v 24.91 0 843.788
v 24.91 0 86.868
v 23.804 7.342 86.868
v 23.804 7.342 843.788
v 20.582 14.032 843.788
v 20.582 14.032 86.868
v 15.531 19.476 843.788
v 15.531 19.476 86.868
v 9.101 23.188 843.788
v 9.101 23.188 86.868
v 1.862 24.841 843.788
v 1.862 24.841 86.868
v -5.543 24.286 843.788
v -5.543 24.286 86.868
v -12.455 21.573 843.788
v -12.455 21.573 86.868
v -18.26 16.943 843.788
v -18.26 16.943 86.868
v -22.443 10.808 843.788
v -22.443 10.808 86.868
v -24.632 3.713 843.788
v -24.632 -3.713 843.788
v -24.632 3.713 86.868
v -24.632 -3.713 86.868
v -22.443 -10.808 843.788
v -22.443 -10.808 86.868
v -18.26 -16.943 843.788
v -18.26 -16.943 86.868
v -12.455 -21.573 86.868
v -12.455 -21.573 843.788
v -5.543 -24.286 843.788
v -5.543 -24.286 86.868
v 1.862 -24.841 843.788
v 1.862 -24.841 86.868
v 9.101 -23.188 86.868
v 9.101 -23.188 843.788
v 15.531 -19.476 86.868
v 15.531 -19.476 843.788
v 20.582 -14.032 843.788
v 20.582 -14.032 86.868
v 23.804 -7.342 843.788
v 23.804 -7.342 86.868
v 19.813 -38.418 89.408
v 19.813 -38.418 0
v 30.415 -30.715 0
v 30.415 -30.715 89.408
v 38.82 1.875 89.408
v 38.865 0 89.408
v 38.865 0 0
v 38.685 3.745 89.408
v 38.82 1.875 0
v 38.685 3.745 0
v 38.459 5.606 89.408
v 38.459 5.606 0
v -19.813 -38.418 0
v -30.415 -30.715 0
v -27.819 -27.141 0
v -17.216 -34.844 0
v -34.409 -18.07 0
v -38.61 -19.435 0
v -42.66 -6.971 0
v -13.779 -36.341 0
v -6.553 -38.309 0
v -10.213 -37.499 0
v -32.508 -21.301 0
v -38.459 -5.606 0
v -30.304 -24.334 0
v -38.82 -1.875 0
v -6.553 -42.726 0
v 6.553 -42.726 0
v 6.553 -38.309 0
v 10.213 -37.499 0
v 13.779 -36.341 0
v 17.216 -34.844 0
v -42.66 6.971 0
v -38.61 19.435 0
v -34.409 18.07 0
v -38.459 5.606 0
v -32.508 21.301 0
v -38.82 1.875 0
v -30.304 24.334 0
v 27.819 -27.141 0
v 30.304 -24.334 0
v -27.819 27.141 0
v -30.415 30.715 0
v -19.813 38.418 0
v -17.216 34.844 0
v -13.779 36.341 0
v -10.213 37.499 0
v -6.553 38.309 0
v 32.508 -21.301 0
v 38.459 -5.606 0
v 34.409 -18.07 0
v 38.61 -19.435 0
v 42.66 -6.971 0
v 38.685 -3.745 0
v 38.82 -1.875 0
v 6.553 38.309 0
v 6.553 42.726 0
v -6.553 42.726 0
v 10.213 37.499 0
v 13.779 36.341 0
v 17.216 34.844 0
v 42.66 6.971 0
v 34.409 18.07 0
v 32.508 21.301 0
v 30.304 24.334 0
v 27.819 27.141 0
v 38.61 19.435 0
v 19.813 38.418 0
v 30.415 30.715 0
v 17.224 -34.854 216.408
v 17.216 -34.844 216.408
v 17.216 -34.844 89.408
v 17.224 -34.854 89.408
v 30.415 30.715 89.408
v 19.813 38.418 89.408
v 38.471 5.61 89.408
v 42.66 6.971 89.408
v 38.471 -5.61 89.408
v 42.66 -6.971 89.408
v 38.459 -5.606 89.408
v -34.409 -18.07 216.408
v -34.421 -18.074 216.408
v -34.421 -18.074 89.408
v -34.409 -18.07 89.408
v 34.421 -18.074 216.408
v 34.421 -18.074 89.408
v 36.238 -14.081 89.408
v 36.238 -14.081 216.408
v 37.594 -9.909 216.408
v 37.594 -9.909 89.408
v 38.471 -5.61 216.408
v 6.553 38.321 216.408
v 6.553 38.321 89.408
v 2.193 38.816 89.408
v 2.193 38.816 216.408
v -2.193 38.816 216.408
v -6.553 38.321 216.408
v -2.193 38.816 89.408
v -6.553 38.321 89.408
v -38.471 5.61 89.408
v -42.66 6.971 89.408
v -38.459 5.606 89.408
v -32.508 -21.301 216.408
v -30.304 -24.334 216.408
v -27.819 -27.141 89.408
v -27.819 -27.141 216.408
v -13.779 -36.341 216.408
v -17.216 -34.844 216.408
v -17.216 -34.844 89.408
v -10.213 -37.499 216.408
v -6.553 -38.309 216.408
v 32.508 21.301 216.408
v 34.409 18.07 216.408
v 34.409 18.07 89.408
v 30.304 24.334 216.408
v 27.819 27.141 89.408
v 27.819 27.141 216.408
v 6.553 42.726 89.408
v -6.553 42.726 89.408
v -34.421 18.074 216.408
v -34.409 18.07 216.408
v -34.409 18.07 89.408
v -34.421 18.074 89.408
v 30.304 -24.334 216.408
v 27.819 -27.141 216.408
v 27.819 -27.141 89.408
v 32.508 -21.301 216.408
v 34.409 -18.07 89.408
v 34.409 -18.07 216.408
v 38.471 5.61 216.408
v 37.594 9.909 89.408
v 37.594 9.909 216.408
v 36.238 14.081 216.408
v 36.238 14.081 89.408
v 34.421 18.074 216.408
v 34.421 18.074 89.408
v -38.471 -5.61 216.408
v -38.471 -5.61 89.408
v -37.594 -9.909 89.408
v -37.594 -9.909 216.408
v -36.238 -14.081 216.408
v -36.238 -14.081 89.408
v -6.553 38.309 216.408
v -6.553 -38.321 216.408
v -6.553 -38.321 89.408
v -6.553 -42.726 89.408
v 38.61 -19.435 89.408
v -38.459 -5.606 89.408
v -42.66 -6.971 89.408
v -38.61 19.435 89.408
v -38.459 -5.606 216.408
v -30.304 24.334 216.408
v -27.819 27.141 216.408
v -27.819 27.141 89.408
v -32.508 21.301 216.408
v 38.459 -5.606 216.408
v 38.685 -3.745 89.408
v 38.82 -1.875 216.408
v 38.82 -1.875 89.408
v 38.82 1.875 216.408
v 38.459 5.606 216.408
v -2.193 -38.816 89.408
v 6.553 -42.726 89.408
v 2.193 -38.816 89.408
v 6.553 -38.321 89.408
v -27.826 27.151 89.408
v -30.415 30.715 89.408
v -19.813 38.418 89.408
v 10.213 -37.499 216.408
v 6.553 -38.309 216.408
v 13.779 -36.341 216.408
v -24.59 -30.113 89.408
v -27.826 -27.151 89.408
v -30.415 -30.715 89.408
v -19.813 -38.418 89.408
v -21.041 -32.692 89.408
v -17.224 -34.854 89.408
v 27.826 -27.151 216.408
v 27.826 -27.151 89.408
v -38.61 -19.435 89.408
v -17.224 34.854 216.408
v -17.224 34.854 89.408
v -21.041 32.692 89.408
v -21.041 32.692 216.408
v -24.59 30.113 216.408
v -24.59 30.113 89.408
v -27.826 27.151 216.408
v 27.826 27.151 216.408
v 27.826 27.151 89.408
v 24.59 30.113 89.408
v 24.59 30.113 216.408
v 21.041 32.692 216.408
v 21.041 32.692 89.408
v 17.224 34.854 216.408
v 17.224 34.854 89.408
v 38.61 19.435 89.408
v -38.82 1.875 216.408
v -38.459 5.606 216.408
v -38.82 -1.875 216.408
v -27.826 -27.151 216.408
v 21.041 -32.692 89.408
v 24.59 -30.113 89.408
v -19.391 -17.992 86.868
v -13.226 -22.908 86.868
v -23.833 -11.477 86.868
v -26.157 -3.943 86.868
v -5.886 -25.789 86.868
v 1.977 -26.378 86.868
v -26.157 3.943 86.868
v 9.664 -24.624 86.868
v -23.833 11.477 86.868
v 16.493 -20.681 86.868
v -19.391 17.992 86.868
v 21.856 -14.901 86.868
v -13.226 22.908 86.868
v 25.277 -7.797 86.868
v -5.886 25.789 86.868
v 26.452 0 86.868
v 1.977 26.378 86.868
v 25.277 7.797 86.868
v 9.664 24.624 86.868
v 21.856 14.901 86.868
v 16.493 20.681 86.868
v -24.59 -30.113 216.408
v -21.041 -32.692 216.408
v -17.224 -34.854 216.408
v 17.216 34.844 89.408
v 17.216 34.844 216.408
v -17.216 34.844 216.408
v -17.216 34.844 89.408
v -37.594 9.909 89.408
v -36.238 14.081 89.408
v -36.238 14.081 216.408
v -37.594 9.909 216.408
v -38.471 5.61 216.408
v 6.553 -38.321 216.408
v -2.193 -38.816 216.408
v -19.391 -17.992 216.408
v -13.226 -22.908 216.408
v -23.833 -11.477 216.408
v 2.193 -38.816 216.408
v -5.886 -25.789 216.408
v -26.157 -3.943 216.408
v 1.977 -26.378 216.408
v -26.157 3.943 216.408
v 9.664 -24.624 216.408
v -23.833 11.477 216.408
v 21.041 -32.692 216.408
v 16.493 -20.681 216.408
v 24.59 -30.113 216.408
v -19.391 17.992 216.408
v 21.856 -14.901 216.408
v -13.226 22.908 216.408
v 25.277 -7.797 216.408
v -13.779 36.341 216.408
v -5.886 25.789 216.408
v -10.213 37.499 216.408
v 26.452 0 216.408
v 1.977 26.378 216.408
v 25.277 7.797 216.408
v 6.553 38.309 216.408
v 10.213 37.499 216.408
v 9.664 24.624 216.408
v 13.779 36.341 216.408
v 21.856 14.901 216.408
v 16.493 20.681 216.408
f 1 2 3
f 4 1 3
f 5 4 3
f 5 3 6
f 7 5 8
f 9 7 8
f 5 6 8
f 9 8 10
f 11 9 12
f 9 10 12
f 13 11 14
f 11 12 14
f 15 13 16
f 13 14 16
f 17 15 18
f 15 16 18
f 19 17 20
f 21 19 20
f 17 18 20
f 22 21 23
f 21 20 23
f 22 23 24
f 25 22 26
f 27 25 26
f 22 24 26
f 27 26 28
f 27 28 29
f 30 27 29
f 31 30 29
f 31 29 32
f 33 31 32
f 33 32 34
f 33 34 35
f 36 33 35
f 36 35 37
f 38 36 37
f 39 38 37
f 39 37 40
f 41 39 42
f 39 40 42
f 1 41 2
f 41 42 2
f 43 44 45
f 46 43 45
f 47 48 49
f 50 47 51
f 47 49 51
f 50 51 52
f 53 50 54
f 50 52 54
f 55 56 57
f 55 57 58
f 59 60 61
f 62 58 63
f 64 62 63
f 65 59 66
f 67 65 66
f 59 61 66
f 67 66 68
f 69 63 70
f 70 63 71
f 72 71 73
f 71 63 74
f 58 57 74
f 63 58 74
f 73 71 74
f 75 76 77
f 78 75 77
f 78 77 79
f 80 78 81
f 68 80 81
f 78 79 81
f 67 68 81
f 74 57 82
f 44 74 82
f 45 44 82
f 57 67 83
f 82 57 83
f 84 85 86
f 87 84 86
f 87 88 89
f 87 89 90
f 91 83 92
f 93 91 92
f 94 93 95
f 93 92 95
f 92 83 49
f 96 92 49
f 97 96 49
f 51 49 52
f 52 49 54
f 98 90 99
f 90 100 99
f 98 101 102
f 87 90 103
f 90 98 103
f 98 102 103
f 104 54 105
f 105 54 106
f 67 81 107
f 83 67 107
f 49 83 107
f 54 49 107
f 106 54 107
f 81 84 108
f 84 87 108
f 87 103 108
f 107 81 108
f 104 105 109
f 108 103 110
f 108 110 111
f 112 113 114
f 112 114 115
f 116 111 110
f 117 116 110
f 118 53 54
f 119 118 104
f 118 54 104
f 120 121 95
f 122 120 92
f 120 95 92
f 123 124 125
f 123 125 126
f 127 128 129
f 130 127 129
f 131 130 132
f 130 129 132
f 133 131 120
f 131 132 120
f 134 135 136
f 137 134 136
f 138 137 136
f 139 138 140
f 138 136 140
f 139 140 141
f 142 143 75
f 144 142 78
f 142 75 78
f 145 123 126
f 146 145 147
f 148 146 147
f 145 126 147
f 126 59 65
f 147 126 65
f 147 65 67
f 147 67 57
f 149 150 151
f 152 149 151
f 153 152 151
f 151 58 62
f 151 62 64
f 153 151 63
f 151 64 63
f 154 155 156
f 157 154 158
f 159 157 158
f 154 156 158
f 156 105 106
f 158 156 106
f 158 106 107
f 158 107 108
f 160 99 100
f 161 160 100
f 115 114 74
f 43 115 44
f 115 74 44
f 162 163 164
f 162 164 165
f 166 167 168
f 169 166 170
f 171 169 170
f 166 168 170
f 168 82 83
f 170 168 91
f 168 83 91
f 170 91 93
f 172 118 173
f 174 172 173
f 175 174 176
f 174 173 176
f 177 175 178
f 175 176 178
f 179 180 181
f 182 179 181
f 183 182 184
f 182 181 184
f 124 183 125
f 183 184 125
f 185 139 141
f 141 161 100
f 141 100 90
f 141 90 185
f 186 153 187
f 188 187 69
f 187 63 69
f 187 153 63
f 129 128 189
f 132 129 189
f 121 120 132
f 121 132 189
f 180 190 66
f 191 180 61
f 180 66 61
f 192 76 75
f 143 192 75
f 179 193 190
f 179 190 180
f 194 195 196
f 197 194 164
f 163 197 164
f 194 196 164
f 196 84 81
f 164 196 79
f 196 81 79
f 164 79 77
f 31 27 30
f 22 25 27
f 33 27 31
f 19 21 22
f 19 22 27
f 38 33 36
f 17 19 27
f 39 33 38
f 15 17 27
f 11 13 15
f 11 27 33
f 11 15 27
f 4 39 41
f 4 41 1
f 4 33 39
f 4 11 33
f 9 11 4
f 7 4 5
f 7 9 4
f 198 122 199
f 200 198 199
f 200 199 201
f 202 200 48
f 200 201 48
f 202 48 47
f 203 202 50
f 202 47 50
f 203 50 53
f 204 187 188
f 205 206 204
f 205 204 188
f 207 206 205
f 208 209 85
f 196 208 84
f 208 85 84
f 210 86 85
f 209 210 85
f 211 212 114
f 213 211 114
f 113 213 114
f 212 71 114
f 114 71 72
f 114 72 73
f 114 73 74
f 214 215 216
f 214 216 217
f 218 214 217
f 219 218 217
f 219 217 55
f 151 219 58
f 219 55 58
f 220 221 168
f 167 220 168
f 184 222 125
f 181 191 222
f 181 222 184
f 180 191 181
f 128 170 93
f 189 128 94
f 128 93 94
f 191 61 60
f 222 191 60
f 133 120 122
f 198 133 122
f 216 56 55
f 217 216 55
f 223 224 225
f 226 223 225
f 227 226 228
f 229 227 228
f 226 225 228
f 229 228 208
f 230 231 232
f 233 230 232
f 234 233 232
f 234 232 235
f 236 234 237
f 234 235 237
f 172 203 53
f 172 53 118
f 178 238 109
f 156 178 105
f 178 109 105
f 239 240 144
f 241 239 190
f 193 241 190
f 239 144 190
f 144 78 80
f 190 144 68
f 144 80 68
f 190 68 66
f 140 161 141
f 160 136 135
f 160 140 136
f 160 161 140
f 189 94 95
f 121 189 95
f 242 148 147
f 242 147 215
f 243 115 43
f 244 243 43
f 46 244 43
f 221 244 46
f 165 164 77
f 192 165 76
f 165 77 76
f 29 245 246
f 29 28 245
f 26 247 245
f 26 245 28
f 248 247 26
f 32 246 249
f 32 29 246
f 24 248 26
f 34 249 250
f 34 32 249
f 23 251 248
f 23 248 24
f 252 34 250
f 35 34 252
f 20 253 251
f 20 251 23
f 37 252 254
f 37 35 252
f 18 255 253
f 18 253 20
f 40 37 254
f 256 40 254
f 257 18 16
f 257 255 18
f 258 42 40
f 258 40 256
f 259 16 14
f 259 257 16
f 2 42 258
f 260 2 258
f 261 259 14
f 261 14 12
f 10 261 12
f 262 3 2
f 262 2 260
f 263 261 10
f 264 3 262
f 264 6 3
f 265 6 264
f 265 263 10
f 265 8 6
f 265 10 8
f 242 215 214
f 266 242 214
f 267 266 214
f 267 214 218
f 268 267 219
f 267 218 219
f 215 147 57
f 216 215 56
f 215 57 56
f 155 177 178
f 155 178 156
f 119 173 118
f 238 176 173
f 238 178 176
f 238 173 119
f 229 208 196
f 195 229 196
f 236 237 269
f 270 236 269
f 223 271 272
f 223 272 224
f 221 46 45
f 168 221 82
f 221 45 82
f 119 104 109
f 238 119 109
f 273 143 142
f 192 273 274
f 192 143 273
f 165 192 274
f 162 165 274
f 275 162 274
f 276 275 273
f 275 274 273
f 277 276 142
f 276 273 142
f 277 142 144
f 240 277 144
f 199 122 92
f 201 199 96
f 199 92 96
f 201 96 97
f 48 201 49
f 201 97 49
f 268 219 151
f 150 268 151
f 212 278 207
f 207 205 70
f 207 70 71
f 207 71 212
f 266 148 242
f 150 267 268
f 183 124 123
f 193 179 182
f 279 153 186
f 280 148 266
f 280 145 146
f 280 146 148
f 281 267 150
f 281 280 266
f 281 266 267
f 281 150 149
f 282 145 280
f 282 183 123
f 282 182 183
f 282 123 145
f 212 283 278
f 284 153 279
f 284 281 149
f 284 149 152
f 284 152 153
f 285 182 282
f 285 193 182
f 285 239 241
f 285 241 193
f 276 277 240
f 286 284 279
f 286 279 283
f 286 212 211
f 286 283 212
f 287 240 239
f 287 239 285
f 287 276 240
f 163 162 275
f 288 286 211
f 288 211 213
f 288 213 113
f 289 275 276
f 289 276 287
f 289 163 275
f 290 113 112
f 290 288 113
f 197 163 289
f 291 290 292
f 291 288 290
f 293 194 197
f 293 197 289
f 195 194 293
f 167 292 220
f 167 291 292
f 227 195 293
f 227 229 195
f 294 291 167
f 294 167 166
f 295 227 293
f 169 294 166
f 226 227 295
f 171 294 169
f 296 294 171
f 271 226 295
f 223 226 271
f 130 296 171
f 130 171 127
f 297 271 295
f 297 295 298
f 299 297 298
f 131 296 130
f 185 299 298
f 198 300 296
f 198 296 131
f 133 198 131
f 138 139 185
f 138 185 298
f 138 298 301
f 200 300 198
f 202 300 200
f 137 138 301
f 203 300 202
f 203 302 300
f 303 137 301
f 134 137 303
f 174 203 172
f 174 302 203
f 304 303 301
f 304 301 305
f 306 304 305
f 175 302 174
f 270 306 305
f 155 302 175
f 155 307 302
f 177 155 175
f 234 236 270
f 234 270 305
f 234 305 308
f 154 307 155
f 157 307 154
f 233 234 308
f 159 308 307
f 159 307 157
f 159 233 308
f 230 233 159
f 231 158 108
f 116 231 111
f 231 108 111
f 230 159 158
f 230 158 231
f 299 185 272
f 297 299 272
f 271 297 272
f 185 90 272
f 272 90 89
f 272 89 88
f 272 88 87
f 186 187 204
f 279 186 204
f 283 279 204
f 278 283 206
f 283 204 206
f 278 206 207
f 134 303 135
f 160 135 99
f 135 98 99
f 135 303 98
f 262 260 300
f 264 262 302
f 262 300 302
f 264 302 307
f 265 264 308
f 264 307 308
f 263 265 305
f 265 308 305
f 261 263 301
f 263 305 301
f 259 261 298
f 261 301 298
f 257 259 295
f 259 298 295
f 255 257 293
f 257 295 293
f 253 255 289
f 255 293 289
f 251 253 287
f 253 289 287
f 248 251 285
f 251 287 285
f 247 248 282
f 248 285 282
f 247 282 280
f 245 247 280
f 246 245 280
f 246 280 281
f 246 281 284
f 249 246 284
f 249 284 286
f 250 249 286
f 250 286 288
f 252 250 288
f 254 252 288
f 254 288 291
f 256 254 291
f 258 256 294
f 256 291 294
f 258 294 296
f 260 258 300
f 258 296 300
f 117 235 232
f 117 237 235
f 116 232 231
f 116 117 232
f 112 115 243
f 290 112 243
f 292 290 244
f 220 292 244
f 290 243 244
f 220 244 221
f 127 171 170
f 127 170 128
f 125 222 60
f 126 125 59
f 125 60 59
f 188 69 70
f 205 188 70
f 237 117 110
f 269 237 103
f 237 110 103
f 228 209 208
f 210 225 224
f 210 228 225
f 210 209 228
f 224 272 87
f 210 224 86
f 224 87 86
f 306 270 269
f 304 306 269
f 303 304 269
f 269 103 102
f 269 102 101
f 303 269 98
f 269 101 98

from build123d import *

# Parameters (mm, degrees)
F1_DEPTH = 89.408
F3_DEPTH = 127
F4_R     = 26.4523902525
F5_DEPTH = 129.54
F6_R     = 24.9101946144
F7_DEPTH = 756.92


with BuildPart() as f1:
    # F0 (on Top) → F1 (new body)
    with BuildSketch(Plane.XY):
        with BuildLine():
            Line((-15.273936304, 32.1706210337), (-17.2163408372, 34.8441115156))
            ThreePointArc((-17.2163408372, 34.8441115156), (-22.8444725114, 31.4427189474), (-27.8185774117, 27.1411357522))
            Line((-27.8185774117, 27.1411357522), (-25.8761728785, 24.4676452704))
            Line((-25.8761728785, 24.4676452704), (-15.273936304, 32.1706210337))
        make_face()
        with BuildLine():
            ThreePointArc((-27.8185774117, 27.1411357522), (-22.8444725114, 31.4427189474), (-17.2163408372, 34.8441115156))
            Line((-17.2163408372, 34.8441115156), (-19.8127721444, 38.4177926245))
            Line((-19.8127721444, 38.4177926245), (-30.4150087189, 30.7148168611))
            Line((-30.4150087189, 30.7148168611), (-27.8185774117, 27.1411357522))
        make_face()
        with BuildLine():
            ThreePointArc((-38.458861211, 5.6062905278), (-36.9631329786, 12.0100499392), (-34.4091671964, 18.0699671274))
            Line((-34.4091671964, 18.0699671274), (-38.6102813008, 19.4349918461))
            Line((-38.6102813008, 19.4349918461), (-42.6599753155, 6.9713152465))
            Line((-42.6599753155, 6.9713152465), (-38.458861211, 5.6062905278))
        make_face()
        with BuildLine():
            Line((-31.2662906416, 17.048784632), (-34.4091671964, 18.0699671274))
            ThreePointArc((-34.4091671964, 18.0699671274), (-36.9631329786, 12.0100499392), (-38.458861211, 5.6062905278))
            Line((-38.458861211, 5.6062905278), (-35.3159846563, 4.5851080324))
            Line((-35.3159846563, 4.5851080324), (-31.2662906416, 17.048784632))
        make_face()
        with BuildLine():
            Line((-38.6102813008, -19.4349918461), (-34.4091671964, -18.0699671274))
            ThreePointArc((-34.4091671964, -18.0699671274), (-36.9631329786, -12.0100499392), (-38.458861211, -5.6062905278))
            Line((-38.458861211, -5.6062905278), (-42.6599753155, -6.9713152465))
            Line((-42.6599753155, -6.9713152465), (-38.6102813008, -19.4349918461))
        make_face()
        with BuildLine():
            ThreePointArc((-38.458861211, -5.6062905278), (-36.9631329786, -12.0100499392), (-34.4091671964, -18.0699671274))
            Line((-34.4091671964, -18.0699671274), (-31.2662906416, -17.048784632))
            Line((-31.2662906416, -17.048784632), (-35.3159846563, -4.5851080324))
            Line((-35.3159846563, -4.5851080324), (-38.458861211, -5.6062905278))
        make_face()
        with BuildLine():
            Line((-19.8127721444, -38.4177926245), (-17.2163408372, -34.8441115156))
            ThreePointArc((-17.2163408372, -34.8441115156), (-22.8444725114, -31.4427189474), (-27.8185774117, -27.1411357522))
            Line((-27.8185774117, -27.1411357522), (-30.4150087189, -30.7148168611))
            Line((-30.4150087189, -30.7148168611), (-19.8127721444, -38.4177926245))
        make_face()
        with BuildLine():
            ThreePointArc((-27.8185774117, -27.1411357522), (-22.8444725114, -31.4427189474), (-17.2163408372, -34.8441115156))
            Line((-17.2163408372, -34.8441115156), (-15.273936304, -32.1706210337))
            Line((-15.273936304, -32.1706210337), (-25.8761728785, -24.4676452704))
            Line((-25.8761728785, -24.4676452704), (-27.8185774117, -27.1411357522))
        make_face()
        with BuildLine():
            Line((6.5525425598, -42.7263023931), (6.5525425598, -38.3089896126))
            ThreePointArc((6.5525425598, -38.3089896126), (0, -38.8653380164), (-6.5525425598, -38.3089896126))
            Line((-6.5525425598, -38.3089896126), (-6.5525425598, -42.7263023931))
            Line((-6.5525425598, -42.7263023931), (6.5525425598, -42.7263023931))
        make_face()
        with BuildLine():
            Line((30.4150087189, -30.7148168611), (27.8185774117, -27.1411357522))
            ThreePointArc((27.8185774117, -27.1411357522), (22.8444725114, -31.4427189474), (17.2163408372, -34.8441115156))
            Line((17.2163408372, -34.8441115156), (19.8127721444, -38.4177926245))
            Line((19.8127721444, -38.4177926245), (30.4150087189, -30.7148168611))
        make_face()
        with BuildLine():
            ThreePointArc((17.2163408372, -34.8441115156), (22.8444725114, -31.4427189474), (27.8185774117, -27.1411357522))
            Line((27.8185774117, -27.1411357522), (25.8761728785, -24.4676452704))
            Line((25.8761728785, -24.4676452704), (15.273936304, -32.1706210337))
            Line((15.273936304, -32.1706210337), (17.2163408372, -34.8441115156))
        make_face()
        with BuildLine():
            ThreePointArc((34.4091671964, -18.0699671274), (36.9631329786, -12.0100499392), (38.458861211, -5.6062905278))
            Line((38.458861211, -5.6062905278), (35.3159846563, -4.5851080324))
            Line((35.3159846563, -4.5851080324), (31.2662906416, -17.048784632))
            Line((31.2662906416, -17.048784632), (34.4091671964, -18.0699671274))
        make_face()
        with BuildLine():
            Line((42.6599753155, -6.9713152465), (38.458861211, -5.6062905278))
            ThreePointArc((38.458861211, -5.6062905278), (36.9631329786, -12.0100499392), (34.4091671964, -18.0699671274))
            Line((34.4091671964, -18.0699671274), (38.6102813008, -19.4349918461))
            Line((38.6102813008, -19.4349918461), (42.6599753155, -6.9713152465))
        make_face()
        with BuildLine():
            Line((35.3159846563, 4.5851080324), (38.458861211, 5.6062905278))
            ThreePointArc((38.458861211, 5.6062905278), (36.9631329786, 12.0100499392), (34.4091671964, 18.0699671274))
            Line((34.4091671964, 18.0699671274), (31.2662906416, 17.048784632))
            Line((31.2662906416, 17.048784632), (35.3159846563, 4.5851080324))
        make_face()
        with BuildLine():
            ThreePointArc((34.4091671964, 18.0699671274), (36.9631329786, 12.0100499392), (38.458861211, 5.6062905278))
            Line((38.458861211, 5.6062905278), (42.6599753155, 6.9713152465))
            Line((42.6599753155, 6.9713152465), (38.6102813008, 19.4349918461))
            Line((38.6102813008, 19.4349918461), (34.4091671964, 18.0699671274))
        make_face()
        with BuildLine():
            Line((25.8761728785, 24.4676452704), (27.8185774117, 27.1411357522))
            ThreePointArc((27.8185774117, 27.1411357522), (22.8444725114, 31.4427189474), (17.2163408372, 34.8441115156))
            Line((17.2163408372, 34.8441115156), (15.273936304, 32.1706210337))
            Line((15.273936304, 32.1706210337), (25.8761728785, 24.4676452704))
        make_face()
        with BuildLine():
            ThreePointArc((17.2163408372, 34.8441115156), (22.8444725114, 31.4427189474), (27.8185774117, 27.1411357522))
            Line((27.8185774117, 27.1411357522), (30.4150087189, 30.7148168611))
            Line((30.4150087189, 30.7148168611), (19.8127721444, 38.4177926245))
            Line((19.8127721444, 38.4177926245), (17.2163408372, 34.8441115156))
        make_face()
        with BuildLine():
            Line((6.5525425598, 35.0043736398), (6.5525425598, 38.3089896126))
            ThreePointArc((6.5525425598, 38.3089896126), (0, 38.8653380164), (-6.5525425598, 38.3089896126))
            Line((-6.5525425598, 38.3089896126), (-6.5525425598, 35.0043736398))
            Line((-6.5525425598, 35.0043736398), (6.5525425598, 35.0043736398))
        make_face()
        with BuildLine():
            ThreePointArc((-6.5525425598, 38.3089896126), (0, 38.8653380164), (6.5525425598, 38.3089896126))
            Line((6.5525425598, 38.3089896126), (6.5525425598, 42.7263023931))
            Line((6.5525425598, 42.7263023931), (-6.5525425598, 42.7263023931))
            Line((-6.5525425598, 42.7263023931), (-6.5525425598, 38.3089896126))
        make_face()
        with BuildLine():
            ThreePointArc((-6.5525425598, -38.3089896126), (0, -38.8653380164), (6.5525425598, -38.3089896126))
            Line((6.5525425598, -38.3089896126), (6.5525425598, -35.0043736398))
            Line((6.5525425598, -35.0043736398), (-6.5525425598, -35.0043736398))
            Line((-6.5525425598, -35.0043736398), (-6.5525425598, -38.3089896126))
        make_face()
        with BuildLine():
            ThreePointArc((38.458861211, -5.6062905278), (38.7635856174, -2.8105033746), (38.8653380164, 0))
            ThreePointArc((38.8653380164, 0), (38.7635856174, 2.8105033746), (38.458861211, 5.6062905278))
            Line((38.458861211, 5.6062905278), (35.3159846563, 4.5851080324))
            Line((35.3159846563, 4.5851080324), (31.2662906416, 17.048784632))
            Line((31.2662906416, 17.048784632), (34.4091671964, 18.0699671274))
            ThreePointArc((34.4091671964, 18.0699671274), (31.4427189474, 22.8444725114), (27.8185774117, 27.1411357522))
            Line((27.8185774117, 27.1411357522), (25.8761728785, 24.4676452704))
            Line((25.8761728785, 24.4676452704), (15.273936304, 32.1706210337))
            Line((15.273936304, 32.1706210337), (17.2163408372, 34.8441115156))
            ThreePointArc((17.2163408372, 34.8441115156), (12.0100499392, 36.9631329786), (6.5525425598, 38.3089896126))
            Line((6.5525425598, 38.3089896126), (6.5525425598, 35.0043736398))
            Line((6.5525425598, 35.0043736398), (-6.5525425598, 35.0043736398))
            Line((-6.5525425598, 35.0043736398), (-6.5525425598, 38.3089896126))
            ThreePointArc((-6.5525425598, 38.3089896126), (-12.0100499392, 36.9631329786), (-17.2163408372, 34.8441115156))
            Line((-17.2163408372, 34.8441115156), (-15.273936304, 32.1706210337))
            Line((-15.273936304, 32.1706210337), (-25.8761728785, 24.4676452704))
            Line((-25.8761728785, 24.4676452704), (-27.8185774117, 27.1411357522))
            ThreePointArc((-27.8185774117, 27.1411357522), (-31.4427189474, 22.8444725114), (-34.4091671964, 18.0699671274))
            Line((-34.4091671964, 18.0699671274), (-31.2662906416, 17.048784632))
            Line((-31.2662906416, 17.048784632), (-35.3159846563, 4.5851080324))
            Line((-35.3159846563, 4.5851080324), (-38.458861211, 5.6062905278))
            ThreePointArc((-38.458861211, 5.6062905278), (-38.8653380164, 0), (-38.458861211, -5.6062905278))
            Line((-38.458861211, -5.6062905278), (-35.3159846563, -4.5851080324))
            Line((-35.3159846563, -4.5851080324), (-31.2662906416, -17.048784632))
            Line((-31.2662906416, -17.048784632), (-34.4091671964, -18.0699671274))
            ThreePointArc((-34.4091671964, -18.0699671274), (-31.4427189474, -22.8444725114), (-27.8185774117, -27.1411357522))
            Line((-27.8185774117, -27.1411357522), (-25.8761728785, -24.4676452704))
            Line((-25.8761728785, -24.4676452704), (-15.273936304, -32.1706210337))
            Line((-15.273936304, -32.1706210337), (-17.2163408372, -34.8441115156))
            ThreePointArc((-17.2163408372, -34.8441115156), (-12.0100499392, -36.9631329786), (-6.5525425598, -38.3089896126))
            Line((-6.5525425598, -38.3089896126), (-6.5525425598, -35.0043736398))
            Line((-6.5525425598, -35.0043736398), (6.5525425598, -35.0043736398))
            Line((6.5525425598, -35.0043736398), (6.5525425598, -38.3089896126))
            ThreePointArc((6.5525425598, -38.3089896126), (12.0100499392, -36.9631329786), (17.2163408372, -34.8441115156))
            Line((17.2163408372, -34.8441115156), (15.273936304, -32.1706210337))
            Line((15.273936304, -32.1706210337), (25.8761728785, -24.4676452704))
            Line((25.8761728785, -24.4676452704), (27.8185774117, -27.1411357522))
            ThreePointArc((27.8185774117, -27.1411357522), (31.4427189474, -22.8444725114), (34.4091671964, -18.0699671274))
            Line((34.4091671964, -18.0699671274), (31.2662906416, -17.048784632))
            Line((31.2662906416, -17.048784632), (35.3159846563, -4.5851080324))
            Line((35.3159846563, -4.5851080324), (38.458861211, -5.6062905278))
        make_face()
    extrude(amount=F1_DEPTH)

    # F2 (on face) → F3 (join)
    with BuildSketch(Plane.XY.offset(89.408)):
        with BuildLine():
            Line((38.458861211, 5.6062905278), (38.4706704839, 5.6101275932))
            ThreePointArc((38.4706704839, 5.6101275932), (36.974773258, 12.0138320953), (34.4209764692, 18.0738041928))
            Line((34.4209764692, 18.0738041928), (34.4091671964, 18.0699671274))
            ThreePointArc((34.4091671964, 18.0699671274), (31.4427189474, 22.8444725114), (27.8185774117, 27.1411357522))
            Line((27.8185774117, 27.1411357522), (27.8258759437, 27.1511813197))
            ThreePointArc((27.8258759437, 27.1511813197), (22.8516665997, 31.4526207605), (17.2236393692, 34.854157083))
            Line((17.2236393692, 34.854157083), (17.2163408372, 34.8441115156))
            ThreePointArc((17.2163408372, 34.8441115156), (12.0100499392, 36.9631329786), (6.5525425598, 38.3089896126))
            Line((6.5525425598, 38.3089896126), (6.5525425598, 38.3214066168))
            ThreePointArc((6.5525425598, 38.3214066168), (0, 38.8775773305), (-6.5525425598, 38.3214066168))
            Line((-6.5525425598, 38.3214066168), (-6.5525425598, 38.3089896126))
            ThreePointArc((-6.5525425598, 38.3089896126), (-12.0100499392, 36.9631329786), (-17.2163408372, 34.8441115156))
            Line((-17.2163408372, 34.8441115156), (-17.2236393692, 34.854157083))
            ThreePointArc((-17.2236393692, 34.854157083), (-22.8516665997, 31.4526207605), (-27.8258759437, 27.1511813197))
            Line((-27.8258759437, 27.1511813197), (-27.8185774117, 27.1411357522))
            ThreePointArc((-27.8185774117, 27.1411357522), (-31.4427189474, 22.8444725114), (-34.4091671964, 18.0699671274))
            Line((-34.4091671964, 18.0699671274), (-34.4209764692, 18.0738041928))
            ThreePointArc((-34.4209764692, 18.0738041928), (-36.974773258, 12.0138320953), (-38.4706704839, 5.6101275932))
            Line((-38.4706704839, 5.6101275932), (-38.458861211, 5.6062905278))
            ThreePointArc((-38.458861211, 5.6062905278), (-38.8653380164, 0), (-38.458861211, -5.6062905278))
            Line((-38.458861211, -5.6062905278), (-38.4706704839, -5.6101275932))
            ThreePointArc((-38.4706704839, -5.6101275932), (-36.974773258, -12.0138320953), (-34.4209764692, -18.0738041928))
            Line((-34.4209764692, -18.0738041928), (-34.4091671964, -18.0699671274))
            ThreePointArc((-34.4091671964, -18.0699671274), (-31.4427189474, -22.8444725114), (-27.8185774117, -27.1411357522))
            Line((-27.8185774117, -27.1411357522), (-27.8258759437, -27.1511813197))
            ThreePointArc((-27.8258759437, -27.1511813197), (-22.8516665997, -31.4526207605), (-17.2236393692, -34.854157083))
            Line((-17.2236393692, -34.854157083), (-17.2163408372, -34.8441115156))
            ThreePointArc((-17.2163408372, -34.8441115156), (-12.0100499392, -36.9631329786), (-6.5525425598, -38.3089896126))
            Line((-6.5525425598, -38.3089896126), (-6.5525425598, -38.3214066168))
            ThreePointArc((-6.5525425598, -38.3214066168), (0, -38.8775773305), (6.5525425598, -38.3214066168))
            Line((6.5525425598, -38.3214066168), (6.5525425598, -38.3089896126))
            ThreePointArc((6.5525425598, -38.3089896126), (12.0100499392, -36.9631329786), (17.2163408372, -34.8441115156))
            Line((17.2163408372, -34.8441115156), (17.2236393692, -34.854157083))
            ThreePointArc((17.2236393692, -34.854157083), (22.8516665997, -31.4526207605), (27.8258759437, -27.1511813197))
            Line((27.8258759437, -27.1511813197), (27.8185774117, -27.1411357522))
            ThreePointArc((27.8185774117, -27.1411357522), (31.4427189474, -22.8444725114), (34.4091671964, -18.0699671274))
            Line((34.4091671964, -18.0699671274), (34.4209764692, -18.0738041928))
            ThreePointArc((34.4209764692, -18.0738041928), (36.974773258, -12.0138320953), (38.4706704839, -5.6101275932))
            Line((38.4706704839, -5.6101275932), (38.458861211, -5.6062905278))
            ThreePointArc((38.458861211, -5.6062905278), (38.8653380164, 0), (38.458861211, 5.6062905278))
        make_face()
    extrude(amount=F3_DEPTH)

    # F4 (on face) → F5 (cut)
    with BuildSketch(Plane.XY.offset(216.408)):
        Circle(F4_R)
    extrude(amount=-F5_DEPTH, mode=Mode.SUBTRACT)

    # F6 (on face) → F7 (join)
    with BuildSketch(Plane.XY.offset(86.868)):
        Circle(F6_R)
    extrude(amount=F7_DEPTH)


solid = f1.part
